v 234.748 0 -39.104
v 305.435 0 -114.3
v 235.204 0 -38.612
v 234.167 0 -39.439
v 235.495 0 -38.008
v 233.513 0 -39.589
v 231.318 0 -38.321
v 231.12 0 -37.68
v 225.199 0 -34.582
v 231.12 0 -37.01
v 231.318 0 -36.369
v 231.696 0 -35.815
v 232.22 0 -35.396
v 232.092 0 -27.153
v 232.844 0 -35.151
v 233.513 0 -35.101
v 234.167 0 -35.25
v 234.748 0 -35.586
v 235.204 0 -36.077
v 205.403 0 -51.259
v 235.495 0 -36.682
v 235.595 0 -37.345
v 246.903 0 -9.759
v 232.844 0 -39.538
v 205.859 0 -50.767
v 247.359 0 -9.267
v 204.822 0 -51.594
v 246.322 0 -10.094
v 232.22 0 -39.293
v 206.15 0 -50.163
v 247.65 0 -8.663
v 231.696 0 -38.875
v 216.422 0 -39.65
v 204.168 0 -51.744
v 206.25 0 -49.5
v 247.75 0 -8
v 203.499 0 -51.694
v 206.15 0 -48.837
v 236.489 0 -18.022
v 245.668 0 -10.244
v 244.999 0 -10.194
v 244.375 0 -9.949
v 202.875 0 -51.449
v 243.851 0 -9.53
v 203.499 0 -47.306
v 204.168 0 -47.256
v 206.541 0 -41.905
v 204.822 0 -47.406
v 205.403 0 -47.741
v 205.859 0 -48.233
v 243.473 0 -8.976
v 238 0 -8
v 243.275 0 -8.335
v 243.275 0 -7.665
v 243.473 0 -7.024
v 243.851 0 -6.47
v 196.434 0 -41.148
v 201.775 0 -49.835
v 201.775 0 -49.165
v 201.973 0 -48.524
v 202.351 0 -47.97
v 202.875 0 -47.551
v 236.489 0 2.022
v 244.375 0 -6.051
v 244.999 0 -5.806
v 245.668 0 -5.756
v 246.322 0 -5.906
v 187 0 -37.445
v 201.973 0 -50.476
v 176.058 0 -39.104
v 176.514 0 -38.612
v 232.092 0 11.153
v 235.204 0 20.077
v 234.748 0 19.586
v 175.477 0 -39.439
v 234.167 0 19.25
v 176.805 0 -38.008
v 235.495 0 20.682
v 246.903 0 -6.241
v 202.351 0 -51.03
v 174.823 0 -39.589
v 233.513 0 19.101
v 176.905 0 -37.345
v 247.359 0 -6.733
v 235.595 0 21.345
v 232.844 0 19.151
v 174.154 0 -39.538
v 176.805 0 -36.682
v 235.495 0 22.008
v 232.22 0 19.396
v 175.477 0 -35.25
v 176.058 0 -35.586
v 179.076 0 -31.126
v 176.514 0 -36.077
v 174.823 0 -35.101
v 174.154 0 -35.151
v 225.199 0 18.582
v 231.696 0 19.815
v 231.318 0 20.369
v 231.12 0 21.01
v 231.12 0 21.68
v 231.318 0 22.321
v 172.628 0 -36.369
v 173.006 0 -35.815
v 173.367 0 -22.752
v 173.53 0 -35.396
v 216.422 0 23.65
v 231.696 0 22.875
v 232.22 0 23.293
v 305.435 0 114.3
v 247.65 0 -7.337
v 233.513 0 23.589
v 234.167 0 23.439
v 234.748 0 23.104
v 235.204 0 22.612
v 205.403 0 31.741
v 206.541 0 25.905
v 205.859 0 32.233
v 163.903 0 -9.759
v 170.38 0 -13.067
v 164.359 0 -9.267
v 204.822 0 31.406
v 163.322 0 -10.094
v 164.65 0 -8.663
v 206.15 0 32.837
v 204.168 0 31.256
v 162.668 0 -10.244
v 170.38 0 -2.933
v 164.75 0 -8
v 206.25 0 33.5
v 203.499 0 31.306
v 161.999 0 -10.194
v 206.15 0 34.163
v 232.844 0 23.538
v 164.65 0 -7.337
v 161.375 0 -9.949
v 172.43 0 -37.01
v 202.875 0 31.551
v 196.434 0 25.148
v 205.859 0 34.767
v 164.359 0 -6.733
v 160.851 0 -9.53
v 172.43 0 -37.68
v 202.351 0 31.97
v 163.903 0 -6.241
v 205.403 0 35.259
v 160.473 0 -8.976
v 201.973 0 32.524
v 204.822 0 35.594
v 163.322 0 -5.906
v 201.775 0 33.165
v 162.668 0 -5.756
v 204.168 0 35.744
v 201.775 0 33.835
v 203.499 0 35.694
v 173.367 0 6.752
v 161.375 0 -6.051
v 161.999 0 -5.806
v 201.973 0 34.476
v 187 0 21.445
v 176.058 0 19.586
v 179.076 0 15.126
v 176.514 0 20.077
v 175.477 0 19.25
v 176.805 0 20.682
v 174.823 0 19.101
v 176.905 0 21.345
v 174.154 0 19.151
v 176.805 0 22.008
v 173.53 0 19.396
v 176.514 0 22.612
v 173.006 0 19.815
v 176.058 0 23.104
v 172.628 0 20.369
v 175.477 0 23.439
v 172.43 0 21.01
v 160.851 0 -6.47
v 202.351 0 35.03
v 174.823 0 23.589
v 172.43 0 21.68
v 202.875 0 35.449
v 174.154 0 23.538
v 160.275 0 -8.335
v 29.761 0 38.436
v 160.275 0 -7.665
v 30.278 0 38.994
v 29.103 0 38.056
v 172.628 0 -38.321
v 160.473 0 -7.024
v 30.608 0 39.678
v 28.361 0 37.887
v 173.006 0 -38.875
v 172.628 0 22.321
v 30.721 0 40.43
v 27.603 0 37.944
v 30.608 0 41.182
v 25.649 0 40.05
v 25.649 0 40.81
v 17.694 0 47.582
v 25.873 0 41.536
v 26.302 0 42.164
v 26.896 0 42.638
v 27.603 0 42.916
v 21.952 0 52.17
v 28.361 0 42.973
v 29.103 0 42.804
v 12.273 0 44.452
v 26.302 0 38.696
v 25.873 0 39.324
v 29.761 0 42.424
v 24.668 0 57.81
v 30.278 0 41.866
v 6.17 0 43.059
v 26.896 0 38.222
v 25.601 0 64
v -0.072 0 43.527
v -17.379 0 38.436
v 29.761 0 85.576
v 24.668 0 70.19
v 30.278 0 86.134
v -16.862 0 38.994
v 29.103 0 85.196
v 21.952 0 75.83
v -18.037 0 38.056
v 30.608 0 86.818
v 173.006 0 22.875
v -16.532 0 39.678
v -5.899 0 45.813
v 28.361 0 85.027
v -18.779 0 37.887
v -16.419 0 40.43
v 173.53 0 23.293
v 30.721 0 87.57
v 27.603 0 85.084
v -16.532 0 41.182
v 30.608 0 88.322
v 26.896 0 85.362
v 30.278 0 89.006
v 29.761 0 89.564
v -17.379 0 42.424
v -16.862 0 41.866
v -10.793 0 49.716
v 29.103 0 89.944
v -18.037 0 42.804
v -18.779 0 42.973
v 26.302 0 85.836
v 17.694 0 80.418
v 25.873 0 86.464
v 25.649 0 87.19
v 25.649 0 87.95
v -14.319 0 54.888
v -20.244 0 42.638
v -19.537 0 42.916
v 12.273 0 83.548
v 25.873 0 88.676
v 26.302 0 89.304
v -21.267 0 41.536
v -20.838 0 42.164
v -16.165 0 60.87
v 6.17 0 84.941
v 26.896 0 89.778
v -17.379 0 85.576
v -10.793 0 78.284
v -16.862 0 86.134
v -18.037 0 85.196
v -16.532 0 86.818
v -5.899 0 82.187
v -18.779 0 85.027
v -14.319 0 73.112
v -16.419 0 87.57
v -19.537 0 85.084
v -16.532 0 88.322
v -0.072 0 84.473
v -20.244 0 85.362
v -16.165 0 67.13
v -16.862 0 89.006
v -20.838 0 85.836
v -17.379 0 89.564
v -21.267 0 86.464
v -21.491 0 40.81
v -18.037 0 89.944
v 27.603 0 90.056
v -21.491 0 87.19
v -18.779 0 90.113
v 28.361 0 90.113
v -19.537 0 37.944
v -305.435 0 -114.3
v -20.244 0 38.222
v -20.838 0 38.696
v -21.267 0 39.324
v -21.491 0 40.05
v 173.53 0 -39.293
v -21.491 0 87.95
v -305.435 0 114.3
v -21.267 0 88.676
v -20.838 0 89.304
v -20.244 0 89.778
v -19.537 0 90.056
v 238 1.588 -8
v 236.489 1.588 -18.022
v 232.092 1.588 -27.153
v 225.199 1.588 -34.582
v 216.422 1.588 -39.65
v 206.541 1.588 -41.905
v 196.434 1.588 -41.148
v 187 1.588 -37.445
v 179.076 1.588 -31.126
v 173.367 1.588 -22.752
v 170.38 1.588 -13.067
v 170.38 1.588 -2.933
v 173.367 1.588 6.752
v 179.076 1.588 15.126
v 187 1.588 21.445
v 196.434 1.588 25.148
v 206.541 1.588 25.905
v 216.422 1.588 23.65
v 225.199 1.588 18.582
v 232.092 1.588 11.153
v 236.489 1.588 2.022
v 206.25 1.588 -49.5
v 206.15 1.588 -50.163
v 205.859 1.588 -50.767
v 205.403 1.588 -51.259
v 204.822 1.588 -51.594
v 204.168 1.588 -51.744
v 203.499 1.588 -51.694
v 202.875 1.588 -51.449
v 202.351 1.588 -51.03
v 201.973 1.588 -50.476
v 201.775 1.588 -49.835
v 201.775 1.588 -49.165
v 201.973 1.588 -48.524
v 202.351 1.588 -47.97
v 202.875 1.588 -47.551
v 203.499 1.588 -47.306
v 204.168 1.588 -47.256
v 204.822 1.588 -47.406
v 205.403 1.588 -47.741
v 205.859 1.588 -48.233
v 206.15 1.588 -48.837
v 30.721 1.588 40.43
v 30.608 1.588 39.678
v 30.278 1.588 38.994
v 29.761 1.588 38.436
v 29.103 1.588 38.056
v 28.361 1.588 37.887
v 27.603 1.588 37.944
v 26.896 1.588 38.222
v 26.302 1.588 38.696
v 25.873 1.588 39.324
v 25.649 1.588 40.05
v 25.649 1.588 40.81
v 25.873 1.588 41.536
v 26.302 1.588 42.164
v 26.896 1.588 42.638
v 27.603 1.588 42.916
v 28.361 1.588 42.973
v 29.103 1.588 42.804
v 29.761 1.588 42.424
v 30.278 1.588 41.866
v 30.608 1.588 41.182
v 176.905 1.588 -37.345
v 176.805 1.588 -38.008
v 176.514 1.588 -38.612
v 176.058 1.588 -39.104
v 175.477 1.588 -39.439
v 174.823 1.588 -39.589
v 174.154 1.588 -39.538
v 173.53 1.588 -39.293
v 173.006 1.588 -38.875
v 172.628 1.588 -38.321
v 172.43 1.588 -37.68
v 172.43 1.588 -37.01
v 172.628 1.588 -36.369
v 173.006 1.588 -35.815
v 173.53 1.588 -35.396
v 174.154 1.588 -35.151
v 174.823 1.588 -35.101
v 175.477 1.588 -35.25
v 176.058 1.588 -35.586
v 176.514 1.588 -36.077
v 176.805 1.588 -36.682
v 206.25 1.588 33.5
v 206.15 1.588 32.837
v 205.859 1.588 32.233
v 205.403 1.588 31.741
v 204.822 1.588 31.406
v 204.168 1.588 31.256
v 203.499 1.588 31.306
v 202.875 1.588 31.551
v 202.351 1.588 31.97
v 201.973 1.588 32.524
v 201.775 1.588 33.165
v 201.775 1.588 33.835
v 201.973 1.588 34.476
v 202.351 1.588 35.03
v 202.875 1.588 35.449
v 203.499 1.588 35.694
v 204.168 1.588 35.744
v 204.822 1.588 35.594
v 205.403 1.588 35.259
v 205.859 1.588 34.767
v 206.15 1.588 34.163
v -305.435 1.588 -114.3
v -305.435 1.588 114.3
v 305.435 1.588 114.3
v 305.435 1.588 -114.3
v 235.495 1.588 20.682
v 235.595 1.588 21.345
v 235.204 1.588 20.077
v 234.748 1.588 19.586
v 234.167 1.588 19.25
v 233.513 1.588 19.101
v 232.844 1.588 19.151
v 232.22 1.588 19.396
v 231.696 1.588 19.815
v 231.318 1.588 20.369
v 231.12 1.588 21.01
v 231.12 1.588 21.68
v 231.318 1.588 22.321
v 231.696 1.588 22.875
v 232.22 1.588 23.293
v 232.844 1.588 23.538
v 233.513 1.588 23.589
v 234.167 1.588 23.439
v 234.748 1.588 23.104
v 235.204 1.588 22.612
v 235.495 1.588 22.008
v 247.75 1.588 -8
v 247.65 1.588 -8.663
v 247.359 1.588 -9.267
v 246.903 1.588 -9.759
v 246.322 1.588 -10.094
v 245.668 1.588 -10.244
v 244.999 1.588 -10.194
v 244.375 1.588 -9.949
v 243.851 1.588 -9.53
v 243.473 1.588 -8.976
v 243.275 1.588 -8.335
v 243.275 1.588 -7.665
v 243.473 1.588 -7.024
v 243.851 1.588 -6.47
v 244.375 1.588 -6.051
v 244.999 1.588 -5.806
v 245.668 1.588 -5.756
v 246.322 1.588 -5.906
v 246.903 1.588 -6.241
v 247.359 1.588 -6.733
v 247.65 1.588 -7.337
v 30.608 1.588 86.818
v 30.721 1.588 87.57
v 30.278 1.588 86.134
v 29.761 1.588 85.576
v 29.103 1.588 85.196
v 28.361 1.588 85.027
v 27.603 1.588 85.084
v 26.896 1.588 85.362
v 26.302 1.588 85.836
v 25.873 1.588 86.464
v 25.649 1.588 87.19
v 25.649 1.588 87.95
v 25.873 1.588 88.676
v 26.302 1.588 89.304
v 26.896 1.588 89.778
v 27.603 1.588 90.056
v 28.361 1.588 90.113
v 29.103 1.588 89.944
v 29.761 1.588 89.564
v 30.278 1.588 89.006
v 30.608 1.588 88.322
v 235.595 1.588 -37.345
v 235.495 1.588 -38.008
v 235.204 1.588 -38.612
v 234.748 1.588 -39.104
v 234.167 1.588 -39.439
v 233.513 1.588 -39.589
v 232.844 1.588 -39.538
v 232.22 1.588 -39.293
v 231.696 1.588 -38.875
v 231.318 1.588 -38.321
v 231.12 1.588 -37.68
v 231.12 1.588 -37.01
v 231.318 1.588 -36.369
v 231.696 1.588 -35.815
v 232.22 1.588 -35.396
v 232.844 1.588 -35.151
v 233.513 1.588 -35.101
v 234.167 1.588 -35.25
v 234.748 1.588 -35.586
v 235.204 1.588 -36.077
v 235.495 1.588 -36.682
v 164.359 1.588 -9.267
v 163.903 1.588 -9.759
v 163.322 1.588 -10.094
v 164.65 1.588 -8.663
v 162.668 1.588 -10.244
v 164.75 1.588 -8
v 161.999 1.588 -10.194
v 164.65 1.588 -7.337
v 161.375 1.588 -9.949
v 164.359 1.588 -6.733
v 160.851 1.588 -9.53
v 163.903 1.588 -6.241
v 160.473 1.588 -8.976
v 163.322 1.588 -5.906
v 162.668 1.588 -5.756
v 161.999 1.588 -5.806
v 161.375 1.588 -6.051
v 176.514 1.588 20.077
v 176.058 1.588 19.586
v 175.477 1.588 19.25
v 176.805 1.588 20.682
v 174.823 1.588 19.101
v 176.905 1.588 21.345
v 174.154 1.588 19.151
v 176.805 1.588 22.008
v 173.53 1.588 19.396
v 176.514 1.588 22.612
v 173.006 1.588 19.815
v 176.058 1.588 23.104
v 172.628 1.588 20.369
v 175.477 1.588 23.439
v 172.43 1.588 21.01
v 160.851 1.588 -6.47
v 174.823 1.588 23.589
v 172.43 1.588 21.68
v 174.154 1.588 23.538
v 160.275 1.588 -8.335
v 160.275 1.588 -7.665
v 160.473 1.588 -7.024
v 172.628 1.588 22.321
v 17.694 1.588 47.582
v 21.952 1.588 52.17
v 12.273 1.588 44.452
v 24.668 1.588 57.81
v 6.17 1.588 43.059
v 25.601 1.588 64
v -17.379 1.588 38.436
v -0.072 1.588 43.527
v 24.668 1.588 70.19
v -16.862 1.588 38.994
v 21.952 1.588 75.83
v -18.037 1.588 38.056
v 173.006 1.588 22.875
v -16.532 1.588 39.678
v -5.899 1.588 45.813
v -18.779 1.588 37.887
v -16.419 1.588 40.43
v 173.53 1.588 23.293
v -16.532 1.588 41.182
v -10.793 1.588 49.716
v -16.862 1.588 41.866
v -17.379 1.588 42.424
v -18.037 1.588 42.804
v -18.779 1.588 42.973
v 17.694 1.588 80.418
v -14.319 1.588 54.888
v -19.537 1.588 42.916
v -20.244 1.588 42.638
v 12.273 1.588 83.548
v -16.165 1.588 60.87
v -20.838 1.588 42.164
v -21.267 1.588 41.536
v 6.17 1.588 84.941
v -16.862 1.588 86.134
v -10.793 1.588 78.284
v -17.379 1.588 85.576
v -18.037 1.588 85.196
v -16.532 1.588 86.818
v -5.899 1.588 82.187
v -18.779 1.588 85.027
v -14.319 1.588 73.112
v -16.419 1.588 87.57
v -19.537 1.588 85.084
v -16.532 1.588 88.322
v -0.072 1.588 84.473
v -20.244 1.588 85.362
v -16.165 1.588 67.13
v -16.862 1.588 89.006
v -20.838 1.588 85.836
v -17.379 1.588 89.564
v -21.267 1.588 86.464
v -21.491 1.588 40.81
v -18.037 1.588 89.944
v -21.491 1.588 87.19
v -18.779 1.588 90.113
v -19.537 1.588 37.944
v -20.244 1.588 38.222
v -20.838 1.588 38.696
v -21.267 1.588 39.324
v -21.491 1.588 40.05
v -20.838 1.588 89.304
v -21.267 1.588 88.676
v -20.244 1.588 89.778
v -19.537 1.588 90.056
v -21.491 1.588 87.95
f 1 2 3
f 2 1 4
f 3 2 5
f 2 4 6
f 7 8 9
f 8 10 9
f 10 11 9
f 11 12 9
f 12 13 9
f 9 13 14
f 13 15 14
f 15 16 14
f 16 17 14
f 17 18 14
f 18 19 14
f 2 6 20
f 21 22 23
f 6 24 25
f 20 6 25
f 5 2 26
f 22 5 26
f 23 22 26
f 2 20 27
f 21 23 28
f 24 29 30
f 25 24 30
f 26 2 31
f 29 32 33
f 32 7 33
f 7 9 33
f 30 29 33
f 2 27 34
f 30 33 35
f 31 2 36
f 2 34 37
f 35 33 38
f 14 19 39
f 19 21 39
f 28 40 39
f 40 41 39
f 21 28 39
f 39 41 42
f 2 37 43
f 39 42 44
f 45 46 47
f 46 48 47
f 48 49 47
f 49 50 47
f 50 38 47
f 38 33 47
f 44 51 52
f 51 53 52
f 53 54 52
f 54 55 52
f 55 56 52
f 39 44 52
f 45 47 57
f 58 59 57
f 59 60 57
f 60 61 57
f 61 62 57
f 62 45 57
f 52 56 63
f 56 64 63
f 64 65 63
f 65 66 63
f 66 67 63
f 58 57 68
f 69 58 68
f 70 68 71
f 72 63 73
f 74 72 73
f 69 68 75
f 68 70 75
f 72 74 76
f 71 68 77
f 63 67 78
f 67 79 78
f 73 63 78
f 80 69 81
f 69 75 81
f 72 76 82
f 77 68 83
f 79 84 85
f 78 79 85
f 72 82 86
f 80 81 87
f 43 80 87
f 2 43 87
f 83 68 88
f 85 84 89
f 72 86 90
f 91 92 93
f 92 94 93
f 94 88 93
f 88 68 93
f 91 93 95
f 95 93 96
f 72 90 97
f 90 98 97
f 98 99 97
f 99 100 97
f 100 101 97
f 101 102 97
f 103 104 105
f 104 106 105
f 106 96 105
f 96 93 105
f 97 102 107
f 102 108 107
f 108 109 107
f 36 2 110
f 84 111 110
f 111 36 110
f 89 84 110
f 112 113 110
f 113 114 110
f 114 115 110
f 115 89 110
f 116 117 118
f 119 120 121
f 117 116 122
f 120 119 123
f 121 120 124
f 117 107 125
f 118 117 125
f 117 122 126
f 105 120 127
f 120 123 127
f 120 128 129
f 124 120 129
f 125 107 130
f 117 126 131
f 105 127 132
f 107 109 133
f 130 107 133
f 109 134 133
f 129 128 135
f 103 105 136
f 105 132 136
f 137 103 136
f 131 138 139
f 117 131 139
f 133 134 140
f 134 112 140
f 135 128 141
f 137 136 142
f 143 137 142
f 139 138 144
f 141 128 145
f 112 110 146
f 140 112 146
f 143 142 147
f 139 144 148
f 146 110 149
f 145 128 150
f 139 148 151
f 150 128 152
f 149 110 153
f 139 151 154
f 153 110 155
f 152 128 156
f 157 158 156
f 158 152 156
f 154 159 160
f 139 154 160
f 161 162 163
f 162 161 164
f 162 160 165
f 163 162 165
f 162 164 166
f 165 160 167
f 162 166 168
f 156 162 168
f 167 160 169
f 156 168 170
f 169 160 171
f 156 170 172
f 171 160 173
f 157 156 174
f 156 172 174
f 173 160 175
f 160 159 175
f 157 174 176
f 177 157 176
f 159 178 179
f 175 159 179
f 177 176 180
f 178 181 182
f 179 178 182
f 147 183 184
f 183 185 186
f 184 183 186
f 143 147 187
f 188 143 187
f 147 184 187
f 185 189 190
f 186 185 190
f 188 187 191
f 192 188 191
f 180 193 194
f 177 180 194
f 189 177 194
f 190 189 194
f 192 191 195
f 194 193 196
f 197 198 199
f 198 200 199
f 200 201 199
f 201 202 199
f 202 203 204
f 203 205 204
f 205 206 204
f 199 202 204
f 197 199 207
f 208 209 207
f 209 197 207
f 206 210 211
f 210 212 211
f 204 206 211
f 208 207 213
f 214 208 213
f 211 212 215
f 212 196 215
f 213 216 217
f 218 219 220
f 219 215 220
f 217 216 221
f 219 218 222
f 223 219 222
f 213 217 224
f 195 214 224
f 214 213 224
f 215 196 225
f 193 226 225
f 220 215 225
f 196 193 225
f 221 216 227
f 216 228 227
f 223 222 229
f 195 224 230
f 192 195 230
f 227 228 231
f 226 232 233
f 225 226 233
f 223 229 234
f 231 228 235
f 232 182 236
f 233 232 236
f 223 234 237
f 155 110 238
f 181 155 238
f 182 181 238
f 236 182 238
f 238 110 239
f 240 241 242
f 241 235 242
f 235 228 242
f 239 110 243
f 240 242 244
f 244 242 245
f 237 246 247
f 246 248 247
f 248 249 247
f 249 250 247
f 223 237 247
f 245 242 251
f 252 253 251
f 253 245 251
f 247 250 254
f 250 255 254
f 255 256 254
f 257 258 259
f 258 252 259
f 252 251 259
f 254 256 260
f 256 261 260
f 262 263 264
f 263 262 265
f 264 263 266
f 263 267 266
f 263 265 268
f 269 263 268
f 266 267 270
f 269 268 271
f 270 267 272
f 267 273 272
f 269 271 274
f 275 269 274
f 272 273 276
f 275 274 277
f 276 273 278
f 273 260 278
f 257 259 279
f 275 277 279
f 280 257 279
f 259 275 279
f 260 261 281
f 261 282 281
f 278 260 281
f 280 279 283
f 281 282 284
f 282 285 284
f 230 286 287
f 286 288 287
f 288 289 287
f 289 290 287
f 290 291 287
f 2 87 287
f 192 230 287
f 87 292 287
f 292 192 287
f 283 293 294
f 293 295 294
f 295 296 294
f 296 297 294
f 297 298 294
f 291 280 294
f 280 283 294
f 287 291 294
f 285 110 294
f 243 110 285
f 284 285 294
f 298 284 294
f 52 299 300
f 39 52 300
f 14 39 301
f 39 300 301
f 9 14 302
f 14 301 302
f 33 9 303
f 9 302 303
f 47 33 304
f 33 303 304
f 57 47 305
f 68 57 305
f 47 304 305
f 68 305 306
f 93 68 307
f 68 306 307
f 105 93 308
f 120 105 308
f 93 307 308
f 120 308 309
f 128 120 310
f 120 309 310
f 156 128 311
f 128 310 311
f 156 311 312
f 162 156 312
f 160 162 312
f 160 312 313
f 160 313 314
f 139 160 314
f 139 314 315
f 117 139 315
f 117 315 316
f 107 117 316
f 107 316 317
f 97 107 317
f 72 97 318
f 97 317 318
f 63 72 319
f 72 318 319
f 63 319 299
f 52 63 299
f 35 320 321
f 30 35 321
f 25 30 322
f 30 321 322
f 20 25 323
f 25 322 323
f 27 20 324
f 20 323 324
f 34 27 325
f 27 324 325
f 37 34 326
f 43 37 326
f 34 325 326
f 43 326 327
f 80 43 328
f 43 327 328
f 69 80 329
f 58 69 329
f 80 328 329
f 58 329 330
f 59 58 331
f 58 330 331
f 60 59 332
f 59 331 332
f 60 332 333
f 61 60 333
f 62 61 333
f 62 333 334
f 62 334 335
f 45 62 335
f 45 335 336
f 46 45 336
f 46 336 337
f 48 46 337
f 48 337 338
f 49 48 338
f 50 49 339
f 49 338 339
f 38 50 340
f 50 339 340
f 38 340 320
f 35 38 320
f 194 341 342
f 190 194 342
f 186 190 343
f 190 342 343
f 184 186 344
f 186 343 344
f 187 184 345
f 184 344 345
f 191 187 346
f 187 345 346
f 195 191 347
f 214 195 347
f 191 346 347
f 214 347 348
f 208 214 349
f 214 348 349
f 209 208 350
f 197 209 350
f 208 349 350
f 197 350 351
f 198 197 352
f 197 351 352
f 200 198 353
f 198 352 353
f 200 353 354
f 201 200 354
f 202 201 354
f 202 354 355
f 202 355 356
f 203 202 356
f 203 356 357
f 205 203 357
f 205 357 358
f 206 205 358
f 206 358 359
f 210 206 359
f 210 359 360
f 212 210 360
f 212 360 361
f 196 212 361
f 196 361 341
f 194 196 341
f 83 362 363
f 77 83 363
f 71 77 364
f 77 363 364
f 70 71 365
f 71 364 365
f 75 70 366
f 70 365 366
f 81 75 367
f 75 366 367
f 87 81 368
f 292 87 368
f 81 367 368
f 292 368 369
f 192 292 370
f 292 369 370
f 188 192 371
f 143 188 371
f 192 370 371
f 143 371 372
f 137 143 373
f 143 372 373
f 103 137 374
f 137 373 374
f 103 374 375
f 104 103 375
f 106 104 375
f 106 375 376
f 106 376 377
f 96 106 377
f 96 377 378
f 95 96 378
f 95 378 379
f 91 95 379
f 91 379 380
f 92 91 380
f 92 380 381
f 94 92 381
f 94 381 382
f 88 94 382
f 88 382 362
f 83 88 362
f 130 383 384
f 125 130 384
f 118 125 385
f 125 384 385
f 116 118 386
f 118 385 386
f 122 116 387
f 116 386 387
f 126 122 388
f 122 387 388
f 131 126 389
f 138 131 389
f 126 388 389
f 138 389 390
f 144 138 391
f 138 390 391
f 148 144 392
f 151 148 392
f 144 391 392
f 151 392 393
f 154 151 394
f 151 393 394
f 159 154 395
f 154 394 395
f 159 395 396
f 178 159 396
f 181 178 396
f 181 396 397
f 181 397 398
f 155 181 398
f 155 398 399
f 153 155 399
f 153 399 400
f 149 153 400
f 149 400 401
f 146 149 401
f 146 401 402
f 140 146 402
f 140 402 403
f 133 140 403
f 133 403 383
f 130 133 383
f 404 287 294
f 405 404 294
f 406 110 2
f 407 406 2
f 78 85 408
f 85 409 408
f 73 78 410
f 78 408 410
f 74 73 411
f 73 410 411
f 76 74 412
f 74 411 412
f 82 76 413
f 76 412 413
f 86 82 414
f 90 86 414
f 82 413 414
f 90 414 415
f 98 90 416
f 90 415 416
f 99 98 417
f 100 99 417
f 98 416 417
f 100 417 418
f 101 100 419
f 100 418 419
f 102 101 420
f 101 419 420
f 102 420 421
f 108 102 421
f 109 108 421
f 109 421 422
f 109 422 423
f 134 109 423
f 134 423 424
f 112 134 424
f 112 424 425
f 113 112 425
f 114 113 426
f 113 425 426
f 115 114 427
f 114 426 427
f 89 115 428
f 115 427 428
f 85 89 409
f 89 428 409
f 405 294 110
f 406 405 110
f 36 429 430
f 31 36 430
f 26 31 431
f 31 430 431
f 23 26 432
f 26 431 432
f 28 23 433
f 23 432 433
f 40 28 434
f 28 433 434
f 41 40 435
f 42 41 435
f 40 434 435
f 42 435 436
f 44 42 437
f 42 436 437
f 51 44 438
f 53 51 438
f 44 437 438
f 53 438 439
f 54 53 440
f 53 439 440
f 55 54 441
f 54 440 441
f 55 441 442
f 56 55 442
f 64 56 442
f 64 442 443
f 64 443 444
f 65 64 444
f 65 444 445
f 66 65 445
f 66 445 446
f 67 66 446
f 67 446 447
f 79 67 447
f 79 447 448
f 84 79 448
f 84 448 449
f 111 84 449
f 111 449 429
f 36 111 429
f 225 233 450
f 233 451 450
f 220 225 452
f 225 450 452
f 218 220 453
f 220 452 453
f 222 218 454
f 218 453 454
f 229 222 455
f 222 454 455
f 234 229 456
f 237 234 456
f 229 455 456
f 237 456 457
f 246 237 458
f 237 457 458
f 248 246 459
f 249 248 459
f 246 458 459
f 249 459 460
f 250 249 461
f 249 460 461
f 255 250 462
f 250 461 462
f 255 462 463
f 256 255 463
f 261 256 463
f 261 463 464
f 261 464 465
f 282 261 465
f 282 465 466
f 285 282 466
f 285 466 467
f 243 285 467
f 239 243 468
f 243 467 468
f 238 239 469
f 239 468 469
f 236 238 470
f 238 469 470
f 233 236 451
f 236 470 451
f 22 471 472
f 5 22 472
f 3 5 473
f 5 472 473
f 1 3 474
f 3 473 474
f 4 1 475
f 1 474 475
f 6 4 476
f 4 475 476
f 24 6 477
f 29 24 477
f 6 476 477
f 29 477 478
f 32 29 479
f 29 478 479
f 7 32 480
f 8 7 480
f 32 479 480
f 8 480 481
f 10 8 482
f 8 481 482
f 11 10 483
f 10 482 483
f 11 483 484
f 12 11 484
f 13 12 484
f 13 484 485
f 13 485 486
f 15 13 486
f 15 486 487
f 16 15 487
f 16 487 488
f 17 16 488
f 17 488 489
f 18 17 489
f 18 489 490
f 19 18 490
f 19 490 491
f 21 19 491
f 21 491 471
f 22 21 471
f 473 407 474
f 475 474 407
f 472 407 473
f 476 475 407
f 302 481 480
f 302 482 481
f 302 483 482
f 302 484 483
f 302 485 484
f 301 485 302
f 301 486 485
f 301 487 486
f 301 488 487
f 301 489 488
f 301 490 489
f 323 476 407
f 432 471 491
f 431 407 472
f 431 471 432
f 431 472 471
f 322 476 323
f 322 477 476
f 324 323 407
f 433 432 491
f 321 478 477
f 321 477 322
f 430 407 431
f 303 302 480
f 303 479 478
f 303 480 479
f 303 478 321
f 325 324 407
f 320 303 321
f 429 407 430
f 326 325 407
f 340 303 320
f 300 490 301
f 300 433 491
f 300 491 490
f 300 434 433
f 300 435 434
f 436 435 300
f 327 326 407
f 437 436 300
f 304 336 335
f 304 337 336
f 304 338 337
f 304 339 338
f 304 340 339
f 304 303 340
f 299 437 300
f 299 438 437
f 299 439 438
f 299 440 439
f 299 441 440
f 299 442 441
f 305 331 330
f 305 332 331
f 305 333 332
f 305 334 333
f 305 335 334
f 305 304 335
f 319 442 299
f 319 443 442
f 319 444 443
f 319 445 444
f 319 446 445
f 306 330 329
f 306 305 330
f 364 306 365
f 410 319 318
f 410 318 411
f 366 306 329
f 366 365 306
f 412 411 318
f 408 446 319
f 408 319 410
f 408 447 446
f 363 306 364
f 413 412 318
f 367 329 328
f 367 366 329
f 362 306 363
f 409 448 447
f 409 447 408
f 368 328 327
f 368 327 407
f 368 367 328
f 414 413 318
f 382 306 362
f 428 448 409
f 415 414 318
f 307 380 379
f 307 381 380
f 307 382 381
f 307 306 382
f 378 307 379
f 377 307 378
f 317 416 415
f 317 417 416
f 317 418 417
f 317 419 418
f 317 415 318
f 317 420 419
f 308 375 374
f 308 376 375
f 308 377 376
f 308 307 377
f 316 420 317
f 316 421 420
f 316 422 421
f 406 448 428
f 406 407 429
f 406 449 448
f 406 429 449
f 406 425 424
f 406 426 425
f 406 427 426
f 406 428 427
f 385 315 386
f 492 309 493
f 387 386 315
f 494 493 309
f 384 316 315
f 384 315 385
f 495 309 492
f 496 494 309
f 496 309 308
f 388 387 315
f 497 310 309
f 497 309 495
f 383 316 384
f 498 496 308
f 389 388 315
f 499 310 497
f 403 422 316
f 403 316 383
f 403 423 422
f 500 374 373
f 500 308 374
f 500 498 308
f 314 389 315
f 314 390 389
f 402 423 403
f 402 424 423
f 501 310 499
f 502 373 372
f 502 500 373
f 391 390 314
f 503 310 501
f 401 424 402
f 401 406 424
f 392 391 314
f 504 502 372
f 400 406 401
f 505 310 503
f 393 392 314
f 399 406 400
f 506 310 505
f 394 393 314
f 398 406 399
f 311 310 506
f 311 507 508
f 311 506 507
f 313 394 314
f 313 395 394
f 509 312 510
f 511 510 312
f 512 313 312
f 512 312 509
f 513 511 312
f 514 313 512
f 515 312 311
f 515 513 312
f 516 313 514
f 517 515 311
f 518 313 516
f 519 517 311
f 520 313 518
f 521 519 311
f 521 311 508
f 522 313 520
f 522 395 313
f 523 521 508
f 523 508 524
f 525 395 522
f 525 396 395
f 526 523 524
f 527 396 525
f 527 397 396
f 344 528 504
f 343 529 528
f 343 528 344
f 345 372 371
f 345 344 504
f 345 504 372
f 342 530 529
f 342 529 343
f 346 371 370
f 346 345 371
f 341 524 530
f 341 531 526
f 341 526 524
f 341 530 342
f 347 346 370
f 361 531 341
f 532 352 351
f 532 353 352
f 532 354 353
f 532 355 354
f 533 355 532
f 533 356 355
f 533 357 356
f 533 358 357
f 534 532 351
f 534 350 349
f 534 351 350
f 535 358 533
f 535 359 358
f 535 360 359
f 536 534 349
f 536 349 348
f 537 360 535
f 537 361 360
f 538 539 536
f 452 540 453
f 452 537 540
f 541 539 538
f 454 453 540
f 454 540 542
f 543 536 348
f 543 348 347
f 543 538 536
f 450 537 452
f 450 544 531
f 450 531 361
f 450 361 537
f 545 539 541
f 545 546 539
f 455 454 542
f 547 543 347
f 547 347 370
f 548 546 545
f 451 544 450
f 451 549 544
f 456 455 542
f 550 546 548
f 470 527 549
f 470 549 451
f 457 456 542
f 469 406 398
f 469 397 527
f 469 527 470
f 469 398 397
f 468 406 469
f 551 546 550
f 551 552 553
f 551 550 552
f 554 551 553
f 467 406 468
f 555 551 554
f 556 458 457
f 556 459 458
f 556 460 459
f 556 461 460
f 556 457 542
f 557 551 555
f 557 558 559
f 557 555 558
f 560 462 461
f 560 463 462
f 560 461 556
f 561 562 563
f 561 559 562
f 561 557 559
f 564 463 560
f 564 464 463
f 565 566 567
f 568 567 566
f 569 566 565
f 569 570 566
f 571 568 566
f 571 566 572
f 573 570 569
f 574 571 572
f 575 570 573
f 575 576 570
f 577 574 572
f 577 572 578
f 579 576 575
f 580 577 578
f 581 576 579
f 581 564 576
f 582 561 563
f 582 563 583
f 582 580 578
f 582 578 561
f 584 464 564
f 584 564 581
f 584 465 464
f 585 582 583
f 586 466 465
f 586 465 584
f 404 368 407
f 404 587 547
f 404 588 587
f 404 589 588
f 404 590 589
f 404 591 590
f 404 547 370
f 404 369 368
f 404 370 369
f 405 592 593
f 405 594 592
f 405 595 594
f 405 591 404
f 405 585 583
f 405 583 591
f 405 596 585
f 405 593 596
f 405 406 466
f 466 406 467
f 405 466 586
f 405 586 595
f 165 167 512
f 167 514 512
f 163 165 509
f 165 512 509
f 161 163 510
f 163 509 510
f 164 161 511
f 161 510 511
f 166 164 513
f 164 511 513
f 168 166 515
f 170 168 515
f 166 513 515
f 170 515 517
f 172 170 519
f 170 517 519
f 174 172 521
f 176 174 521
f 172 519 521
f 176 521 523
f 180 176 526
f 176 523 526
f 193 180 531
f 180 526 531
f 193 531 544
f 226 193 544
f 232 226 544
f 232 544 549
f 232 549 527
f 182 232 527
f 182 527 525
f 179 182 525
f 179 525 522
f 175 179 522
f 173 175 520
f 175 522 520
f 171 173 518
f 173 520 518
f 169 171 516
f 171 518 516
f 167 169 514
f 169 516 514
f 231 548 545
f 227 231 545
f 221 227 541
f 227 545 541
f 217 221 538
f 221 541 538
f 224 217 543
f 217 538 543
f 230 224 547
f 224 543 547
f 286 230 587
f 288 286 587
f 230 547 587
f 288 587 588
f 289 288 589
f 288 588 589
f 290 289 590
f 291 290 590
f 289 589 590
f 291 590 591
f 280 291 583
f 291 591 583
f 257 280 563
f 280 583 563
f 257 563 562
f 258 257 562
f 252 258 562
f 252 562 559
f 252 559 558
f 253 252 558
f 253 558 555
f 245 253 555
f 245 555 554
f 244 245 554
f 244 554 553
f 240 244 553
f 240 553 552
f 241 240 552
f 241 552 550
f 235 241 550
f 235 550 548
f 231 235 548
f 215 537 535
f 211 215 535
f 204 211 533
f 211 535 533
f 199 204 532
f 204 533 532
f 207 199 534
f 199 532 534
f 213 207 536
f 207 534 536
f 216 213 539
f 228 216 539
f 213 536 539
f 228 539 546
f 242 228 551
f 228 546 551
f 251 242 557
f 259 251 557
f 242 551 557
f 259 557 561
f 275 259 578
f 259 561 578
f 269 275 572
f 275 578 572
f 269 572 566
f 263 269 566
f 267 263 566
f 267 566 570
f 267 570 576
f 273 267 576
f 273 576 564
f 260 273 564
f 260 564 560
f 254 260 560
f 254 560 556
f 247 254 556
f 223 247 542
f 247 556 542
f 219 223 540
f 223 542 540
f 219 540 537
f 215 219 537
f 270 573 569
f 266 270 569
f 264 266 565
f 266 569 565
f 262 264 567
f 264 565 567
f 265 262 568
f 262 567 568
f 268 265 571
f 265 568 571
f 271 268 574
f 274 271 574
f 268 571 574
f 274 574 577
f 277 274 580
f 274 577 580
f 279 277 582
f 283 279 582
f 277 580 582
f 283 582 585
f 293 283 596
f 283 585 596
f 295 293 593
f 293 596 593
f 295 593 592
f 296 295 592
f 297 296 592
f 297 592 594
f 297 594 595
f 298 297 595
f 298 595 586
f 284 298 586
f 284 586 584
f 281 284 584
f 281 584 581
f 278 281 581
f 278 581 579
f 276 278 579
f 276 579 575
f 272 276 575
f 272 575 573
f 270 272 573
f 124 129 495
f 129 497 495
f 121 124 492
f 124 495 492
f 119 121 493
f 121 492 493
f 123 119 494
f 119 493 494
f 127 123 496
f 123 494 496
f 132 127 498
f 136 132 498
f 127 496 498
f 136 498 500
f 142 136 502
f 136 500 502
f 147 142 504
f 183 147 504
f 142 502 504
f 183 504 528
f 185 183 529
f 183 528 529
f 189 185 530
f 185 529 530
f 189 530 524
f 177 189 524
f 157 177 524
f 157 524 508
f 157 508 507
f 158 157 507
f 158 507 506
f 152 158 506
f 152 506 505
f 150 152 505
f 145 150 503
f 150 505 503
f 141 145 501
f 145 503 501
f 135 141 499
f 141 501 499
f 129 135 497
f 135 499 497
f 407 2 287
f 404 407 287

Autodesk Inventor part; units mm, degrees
ref_plane "YZ Plane" through (0, 0, 0) normal (1, 0, 0) x (0, 1, 0)
ref_plane "XZ Plane" through (0, 0, 0) normal (0, 1, 0) x (-1, 0, 0)
ref_plane "XY Plane" through (0, 0, 0) normal (0, 0, 1) x (1, 0, 0)
sketch "Sketch1" plane through (0, 0, 0) normal (0, 1, 0) x (-1, 0, 0)
  line L0 (305.435, 114.3) -> (-305.435, 114.3)
  line L1 (-305.435, 114.3) -> (-305.435, -114.3)
  line L2 (-305.435, -114.3) -> (305.435, -114.3)
  line L3 (305.435, -114.3) -> (305.435, 114.3)
  line L4 (305.435, 114.3) -> (-305.435, -114.3) construction
  line L5 (-305.435, 114.3) -> (305.435, -114.3) construction
  point P0 (0, 0)
  dimension "d0" = 610.87
  dimension "d1" = 228.6
extrude "Extrusion1" add sketch "Sketch1" along normal blind 1.5875
sketch "Sketch2" plane through (0, 1.5875, 0) normal (0, 1, 0) x (1, 0, 0)
  circle A0 centre (204, 8) radius 34
  circle A1 centre (204, 49.5) radius 2.25
  circle A2 centre (174.6551, 37.3449) radius 2.25
  circle A3 centre (162.5, 8) radius 2.25
  circle A4 centre (174.6551, -21.3449) radius 2.25
  circle A5 centre (204, -33.5) radius 2.25
  circle A6 centre (233.3449, -21.3449) radius 2.25
  circle A7 centre (245.5, 8) radius 2.25
  circle A8 centre (233.3449, 37.3449) radius 2.25
  point P0 (0, 0)
  dimension "d4" = 68
  dimension "d6" = 4.5
  dimension "d7" = 41.5
  dimension "d10" = 360
  dimension "d15" = 204
  dimension "d16" = 8
extrude "Extrusion2" cut sketch "Sketch2" against normal blind 1.5875
sketch "Sketch3" plane through (0, 1.5875, 0) normal (0, 1, 0) x (1, 0, 0)
  circle A0 centre (4.6009, -64) radius 21
  circle A1 centre (204, 8) radius 34 construction
  circle A2 centre (204, 8) radius 106 construction
  circle A3 centre (-18.9691, -87.57) radius 2.55
  circle A4 centre (28.1709, -87.57) radius 2.55
  circle A5 centre (28.1709, -40.43) radius 2.55
  circle A6 centre (-18.9691, -40.43) radius 2.55
  line L0 (4.6009, -64) -> (204, 8) construction
  point P0 (0, 0)
  dimension "d17" = 42
  dimension "d18" = 212
  dimension "d20" = 72
  dimension "d21" = 5.1
  dimension "d22" = 23.57
  dimension "d23" = 23.57
  dimension "d26" = 360
  dimension "d30" = 212
extrude "Extrusion3" cut sketch "Sketch3" against normal through all
equation "\"d23\" = d22"
properties part number "ElectronicsBoxLid"
